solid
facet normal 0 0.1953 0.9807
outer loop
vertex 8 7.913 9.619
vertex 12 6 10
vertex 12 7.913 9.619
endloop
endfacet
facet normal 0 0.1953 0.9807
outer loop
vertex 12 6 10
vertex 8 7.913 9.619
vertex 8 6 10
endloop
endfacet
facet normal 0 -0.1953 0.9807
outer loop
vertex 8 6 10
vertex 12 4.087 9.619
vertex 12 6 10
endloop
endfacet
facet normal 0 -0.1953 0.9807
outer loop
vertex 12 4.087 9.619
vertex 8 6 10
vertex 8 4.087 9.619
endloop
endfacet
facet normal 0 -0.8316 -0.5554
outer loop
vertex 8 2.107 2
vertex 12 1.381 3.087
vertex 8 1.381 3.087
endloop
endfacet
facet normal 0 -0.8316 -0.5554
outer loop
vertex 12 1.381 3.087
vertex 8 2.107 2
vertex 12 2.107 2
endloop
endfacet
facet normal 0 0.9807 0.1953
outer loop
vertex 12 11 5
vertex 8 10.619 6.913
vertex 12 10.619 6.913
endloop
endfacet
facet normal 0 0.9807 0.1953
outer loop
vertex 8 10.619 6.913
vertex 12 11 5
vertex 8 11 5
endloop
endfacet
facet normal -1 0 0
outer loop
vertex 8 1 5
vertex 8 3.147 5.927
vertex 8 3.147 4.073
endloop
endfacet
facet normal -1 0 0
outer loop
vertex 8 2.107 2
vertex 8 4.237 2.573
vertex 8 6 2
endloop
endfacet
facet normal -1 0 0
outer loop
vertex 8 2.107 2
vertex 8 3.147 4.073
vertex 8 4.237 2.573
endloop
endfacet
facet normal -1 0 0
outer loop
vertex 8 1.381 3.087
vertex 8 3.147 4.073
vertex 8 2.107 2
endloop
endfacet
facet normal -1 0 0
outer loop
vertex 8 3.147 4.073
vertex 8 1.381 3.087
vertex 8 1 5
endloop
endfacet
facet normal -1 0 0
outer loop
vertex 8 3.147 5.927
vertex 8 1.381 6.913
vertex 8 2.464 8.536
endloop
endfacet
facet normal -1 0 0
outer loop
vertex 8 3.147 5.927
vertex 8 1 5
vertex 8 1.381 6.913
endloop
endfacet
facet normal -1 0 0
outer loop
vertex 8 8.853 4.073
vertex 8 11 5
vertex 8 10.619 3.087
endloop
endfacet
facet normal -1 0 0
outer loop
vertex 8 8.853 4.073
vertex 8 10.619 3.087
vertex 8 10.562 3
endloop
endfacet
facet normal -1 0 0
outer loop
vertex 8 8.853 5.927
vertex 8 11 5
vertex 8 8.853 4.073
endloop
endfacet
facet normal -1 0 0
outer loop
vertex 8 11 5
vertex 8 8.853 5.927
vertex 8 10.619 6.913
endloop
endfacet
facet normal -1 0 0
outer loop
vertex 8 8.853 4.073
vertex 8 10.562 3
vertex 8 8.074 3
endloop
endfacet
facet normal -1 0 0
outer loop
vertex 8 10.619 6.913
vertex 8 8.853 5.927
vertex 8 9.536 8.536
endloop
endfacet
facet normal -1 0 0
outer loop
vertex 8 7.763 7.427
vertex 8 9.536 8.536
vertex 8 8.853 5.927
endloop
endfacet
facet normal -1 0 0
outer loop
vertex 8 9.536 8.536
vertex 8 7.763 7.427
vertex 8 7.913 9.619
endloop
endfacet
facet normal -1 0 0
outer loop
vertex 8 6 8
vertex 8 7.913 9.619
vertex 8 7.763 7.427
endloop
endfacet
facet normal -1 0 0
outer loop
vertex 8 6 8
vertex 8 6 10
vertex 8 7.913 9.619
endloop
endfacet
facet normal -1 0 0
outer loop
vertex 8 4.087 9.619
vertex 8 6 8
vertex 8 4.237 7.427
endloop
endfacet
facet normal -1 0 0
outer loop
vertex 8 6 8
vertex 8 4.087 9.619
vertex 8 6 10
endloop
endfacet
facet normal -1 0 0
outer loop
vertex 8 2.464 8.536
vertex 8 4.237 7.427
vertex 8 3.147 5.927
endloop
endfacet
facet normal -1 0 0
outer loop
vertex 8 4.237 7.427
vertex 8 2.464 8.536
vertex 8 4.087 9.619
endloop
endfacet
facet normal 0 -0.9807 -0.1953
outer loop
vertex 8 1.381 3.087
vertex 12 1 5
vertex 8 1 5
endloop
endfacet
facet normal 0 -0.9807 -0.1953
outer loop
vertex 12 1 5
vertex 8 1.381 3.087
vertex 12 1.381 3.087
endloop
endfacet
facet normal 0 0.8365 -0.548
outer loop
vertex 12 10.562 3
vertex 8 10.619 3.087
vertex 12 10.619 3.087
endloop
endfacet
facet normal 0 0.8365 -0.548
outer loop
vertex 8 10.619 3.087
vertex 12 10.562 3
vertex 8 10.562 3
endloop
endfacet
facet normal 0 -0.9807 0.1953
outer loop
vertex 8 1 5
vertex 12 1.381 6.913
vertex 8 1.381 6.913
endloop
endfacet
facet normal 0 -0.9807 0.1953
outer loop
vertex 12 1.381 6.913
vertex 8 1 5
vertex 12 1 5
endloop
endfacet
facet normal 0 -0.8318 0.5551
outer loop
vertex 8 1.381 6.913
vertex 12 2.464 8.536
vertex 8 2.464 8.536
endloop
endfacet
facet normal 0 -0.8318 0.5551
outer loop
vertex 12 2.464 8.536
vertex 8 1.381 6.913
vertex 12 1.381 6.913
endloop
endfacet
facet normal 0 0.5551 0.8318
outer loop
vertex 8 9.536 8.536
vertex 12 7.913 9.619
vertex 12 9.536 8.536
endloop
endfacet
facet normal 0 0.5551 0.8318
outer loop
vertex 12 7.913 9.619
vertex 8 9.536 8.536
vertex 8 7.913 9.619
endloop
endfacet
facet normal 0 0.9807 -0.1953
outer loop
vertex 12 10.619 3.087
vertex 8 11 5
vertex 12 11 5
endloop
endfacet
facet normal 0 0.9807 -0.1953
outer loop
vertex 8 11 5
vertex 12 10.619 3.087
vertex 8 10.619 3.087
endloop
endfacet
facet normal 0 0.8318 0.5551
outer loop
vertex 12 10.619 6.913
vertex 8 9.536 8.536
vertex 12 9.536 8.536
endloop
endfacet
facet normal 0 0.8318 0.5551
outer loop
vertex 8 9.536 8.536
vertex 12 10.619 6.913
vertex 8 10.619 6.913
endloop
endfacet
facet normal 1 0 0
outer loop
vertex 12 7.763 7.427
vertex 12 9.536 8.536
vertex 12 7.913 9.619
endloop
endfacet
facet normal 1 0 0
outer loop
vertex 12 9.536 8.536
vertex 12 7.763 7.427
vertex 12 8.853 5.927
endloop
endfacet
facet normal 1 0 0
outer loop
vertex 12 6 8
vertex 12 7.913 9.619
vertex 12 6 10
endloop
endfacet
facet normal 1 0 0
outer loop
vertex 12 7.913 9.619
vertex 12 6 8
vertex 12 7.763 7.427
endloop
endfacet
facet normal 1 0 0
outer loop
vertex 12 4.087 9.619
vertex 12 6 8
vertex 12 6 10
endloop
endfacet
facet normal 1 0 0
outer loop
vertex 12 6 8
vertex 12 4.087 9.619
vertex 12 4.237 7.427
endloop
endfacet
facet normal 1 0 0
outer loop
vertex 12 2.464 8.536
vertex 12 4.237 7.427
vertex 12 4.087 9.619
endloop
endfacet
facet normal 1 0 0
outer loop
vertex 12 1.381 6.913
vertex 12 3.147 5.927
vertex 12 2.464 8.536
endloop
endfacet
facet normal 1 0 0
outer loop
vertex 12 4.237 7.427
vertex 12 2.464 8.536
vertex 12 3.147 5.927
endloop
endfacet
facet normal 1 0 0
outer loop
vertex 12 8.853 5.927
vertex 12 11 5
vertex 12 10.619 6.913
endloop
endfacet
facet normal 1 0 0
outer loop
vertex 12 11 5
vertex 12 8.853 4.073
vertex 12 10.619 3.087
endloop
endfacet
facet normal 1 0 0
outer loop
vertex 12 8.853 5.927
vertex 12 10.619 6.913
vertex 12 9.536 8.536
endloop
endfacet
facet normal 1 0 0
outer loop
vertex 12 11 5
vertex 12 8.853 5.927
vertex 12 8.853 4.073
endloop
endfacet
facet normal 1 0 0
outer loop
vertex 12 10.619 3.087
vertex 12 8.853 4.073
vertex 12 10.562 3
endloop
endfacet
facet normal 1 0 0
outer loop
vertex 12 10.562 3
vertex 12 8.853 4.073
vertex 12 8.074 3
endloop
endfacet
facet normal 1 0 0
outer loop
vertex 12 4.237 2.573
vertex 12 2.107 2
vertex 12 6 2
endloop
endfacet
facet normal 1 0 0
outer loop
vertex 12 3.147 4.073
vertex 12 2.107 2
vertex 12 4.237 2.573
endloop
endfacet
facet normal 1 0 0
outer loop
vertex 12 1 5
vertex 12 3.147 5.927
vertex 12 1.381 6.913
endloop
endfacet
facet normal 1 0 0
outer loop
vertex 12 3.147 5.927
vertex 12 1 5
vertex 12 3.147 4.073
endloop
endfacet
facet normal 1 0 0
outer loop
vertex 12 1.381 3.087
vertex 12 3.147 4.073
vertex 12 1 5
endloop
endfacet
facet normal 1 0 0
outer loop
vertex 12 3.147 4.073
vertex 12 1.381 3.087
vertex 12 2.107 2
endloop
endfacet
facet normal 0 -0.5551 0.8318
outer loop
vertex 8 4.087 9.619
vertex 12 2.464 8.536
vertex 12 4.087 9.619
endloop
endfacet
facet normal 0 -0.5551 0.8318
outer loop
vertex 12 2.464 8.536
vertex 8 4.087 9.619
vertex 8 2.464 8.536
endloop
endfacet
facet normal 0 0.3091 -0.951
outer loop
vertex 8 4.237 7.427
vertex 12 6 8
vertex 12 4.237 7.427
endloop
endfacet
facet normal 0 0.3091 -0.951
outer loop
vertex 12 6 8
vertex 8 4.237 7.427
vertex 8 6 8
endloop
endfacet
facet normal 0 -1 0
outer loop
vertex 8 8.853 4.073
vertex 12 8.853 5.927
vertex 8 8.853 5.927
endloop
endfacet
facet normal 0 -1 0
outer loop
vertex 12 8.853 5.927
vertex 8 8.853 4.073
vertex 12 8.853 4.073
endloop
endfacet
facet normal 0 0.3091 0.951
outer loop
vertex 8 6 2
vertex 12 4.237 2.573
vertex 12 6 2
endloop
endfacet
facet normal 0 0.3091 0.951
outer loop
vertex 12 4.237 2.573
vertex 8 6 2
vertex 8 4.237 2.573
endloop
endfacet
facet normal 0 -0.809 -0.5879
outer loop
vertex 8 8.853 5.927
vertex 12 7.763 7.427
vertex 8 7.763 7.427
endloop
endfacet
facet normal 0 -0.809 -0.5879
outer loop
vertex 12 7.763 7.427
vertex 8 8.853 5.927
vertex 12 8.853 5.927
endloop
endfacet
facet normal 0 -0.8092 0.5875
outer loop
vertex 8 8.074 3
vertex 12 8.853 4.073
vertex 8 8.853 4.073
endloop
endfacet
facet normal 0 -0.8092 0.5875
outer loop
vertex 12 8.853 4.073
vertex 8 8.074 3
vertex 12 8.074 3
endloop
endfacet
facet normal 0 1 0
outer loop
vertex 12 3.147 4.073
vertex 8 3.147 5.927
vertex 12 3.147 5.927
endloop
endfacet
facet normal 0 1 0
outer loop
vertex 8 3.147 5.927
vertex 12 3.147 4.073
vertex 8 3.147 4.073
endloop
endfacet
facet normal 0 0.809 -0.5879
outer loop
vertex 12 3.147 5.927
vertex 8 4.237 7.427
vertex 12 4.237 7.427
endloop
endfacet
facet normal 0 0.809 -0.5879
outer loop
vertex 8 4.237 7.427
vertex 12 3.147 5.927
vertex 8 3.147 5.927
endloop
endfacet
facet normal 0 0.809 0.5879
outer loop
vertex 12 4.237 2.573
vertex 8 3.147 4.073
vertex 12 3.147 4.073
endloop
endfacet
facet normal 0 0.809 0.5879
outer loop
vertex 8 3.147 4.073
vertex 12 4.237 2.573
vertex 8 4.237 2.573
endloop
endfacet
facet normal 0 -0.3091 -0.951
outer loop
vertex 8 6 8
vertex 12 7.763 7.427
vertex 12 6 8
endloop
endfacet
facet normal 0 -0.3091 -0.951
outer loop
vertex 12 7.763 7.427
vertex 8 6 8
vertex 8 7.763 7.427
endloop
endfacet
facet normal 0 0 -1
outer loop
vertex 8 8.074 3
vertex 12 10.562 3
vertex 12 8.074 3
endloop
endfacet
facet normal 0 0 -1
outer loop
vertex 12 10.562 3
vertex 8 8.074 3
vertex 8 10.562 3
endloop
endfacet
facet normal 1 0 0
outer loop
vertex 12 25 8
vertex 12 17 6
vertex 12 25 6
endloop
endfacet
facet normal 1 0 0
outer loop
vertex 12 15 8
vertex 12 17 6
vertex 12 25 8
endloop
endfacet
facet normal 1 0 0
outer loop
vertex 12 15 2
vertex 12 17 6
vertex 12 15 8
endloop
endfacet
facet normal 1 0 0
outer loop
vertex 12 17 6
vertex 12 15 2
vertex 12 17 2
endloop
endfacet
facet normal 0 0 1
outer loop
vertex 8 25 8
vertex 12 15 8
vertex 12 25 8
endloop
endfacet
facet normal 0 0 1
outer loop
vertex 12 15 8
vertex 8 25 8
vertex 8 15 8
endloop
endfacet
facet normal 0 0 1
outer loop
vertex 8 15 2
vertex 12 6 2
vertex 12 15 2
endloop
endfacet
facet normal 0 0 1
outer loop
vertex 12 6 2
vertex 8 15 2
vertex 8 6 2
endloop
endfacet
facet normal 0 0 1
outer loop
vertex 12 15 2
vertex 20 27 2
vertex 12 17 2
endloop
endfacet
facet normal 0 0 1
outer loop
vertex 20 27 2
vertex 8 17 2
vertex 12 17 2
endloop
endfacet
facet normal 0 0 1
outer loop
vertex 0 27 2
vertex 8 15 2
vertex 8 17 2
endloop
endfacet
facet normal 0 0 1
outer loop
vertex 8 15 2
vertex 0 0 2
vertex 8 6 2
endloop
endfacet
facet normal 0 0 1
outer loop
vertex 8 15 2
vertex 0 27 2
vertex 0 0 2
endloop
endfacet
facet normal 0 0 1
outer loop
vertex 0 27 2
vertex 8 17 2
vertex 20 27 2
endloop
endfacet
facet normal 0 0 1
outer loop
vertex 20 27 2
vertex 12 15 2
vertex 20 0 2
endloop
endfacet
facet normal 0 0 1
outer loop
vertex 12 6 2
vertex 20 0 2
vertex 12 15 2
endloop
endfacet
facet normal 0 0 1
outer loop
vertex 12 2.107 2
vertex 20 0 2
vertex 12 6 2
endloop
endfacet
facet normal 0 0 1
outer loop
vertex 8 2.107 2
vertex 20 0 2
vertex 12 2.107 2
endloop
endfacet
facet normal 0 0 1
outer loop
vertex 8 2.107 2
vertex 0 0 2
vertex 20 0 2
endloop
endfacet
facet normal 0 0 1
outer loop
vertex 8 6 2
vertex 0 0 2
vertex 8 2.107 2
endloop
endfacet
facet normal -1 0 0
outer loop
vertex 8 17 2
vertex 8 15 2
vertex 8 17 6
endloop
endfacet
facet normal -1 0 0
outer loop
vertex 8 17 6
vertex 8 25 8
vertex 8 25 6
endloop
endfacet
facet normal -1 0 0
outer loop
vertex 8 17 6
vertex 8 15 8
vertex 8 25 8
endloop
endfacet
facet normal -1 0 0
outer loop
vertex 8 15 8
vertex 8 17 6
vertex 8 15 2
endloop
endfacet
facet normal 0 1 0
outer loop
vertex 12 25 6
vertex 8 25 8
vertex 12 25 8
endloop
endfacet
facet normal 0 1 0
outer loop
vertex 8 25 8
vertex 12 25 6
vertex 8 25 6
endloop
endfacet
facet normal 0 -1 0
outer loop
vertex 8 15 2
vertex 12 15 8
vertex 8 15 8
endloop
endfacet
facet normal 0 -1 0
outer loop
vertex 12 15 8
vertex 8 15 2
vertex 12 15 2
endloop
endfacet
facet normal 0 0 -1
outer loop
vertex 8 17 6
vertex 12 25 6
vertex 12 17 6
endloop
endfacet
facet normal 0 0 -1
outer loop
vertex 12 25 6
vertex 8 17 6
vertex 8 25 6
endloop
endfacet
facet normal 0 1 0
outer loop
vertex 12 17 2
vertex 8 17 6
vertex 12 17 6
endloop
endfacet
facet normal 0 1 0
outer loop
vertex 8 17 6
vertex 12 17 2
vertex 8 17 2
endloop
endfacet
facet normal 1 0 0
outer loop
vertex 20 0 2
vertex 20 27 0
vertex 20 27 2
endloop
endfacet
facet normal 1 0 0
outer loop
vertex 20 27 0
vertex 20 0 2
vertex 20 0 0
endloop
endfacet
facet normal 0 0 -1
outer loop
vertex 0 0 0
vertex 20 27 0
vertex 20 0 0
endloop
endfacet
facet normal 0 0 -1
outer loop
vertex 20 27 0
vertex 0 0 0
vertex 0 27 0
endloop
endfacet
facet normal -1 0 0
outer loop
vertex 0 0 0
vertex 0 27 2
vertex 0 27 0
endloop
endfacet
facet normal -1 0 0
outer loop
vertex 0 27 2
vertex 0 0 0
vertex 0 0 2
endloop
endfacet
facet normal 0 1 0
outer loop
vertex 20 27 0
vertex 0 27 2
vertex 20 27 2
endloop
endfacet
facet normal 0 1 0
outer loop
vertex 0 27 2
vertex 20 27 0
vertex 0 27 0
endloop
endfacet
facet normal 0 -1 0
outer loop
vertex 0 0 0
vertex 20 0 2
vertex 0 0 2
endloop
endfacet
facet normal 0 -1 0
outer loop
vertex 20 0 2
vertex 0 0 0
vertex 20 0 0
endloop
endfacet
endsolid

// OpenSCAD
cube([20,27,2]);
difference()
{
    translate([8,6,5]) rotate([0,90,0]) cylinder(h=4,d=10);
    translate([6,6,5]) rotate([0,90,0]) cylinder(h=8,d=6);
    translate([6,6,1]) cube([8,8,2]);
}
difference()
{
    translate([8,15,2]) cube([4,10,6]);
    translate([6,17,2]) cube([8,14,4]);
}
